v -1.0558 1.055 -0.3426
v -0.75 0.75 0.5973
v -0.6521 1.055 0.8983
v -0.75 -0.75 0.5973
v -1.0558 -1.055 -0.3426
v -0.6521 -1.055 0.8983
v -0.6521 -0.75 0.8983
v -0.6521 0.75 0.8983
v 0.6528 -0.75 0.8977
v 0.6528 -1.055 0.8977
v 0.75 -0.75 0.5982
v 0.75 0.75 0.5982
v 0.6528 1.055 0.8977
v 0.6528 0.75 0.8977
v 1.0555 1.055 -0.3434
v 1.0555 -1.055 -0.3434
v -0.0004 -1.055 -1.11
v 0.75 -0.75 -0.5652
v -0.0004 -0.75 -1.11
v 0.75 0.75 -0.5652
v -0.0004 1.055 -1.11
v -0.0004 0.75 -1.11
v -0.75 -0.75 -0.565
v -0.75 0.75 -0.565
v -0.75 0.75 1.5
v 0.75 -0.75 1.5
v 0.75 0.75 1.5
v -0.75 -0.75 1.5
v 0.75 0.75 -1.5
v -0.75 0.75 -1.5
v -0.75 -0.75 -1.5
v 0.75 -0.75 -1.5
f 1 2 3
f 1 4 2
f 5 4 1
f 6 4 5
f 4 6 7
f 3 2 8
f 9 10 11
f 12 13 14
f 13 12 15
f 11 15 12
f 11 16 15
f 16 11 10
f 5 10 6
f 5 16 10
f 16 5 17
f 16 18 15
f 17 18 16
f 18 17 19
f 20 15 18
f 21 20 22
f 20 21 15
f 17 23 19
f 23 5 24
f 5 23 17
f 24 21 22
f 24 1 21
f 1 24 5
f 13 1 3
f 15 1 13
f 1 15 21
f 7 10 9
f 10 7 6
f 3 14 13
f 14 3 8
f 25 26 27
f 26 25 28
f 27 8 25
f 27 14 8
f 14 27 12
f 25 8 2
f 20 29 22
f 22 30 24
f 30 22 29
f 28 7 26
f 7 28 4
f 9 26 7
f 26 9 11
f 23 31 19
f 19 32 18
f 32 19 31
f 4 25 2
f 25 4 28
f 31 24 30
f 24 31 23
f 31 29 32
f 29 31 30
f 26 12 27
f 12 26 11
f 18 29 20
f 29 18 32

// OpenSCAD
translate([0.0,0,0.0]){
	rotate([90,-125.97687149047852,0]){
		cylinder($fn = 5, h = 2.11, r1 = 1.11, r2 = 1.11, center = true);
	}
}
translate([0,0.0,0.0]){
	rotate([0,-0.0,90]){
		cube([1.5,1.5,3.0], center = true);
	}
}
